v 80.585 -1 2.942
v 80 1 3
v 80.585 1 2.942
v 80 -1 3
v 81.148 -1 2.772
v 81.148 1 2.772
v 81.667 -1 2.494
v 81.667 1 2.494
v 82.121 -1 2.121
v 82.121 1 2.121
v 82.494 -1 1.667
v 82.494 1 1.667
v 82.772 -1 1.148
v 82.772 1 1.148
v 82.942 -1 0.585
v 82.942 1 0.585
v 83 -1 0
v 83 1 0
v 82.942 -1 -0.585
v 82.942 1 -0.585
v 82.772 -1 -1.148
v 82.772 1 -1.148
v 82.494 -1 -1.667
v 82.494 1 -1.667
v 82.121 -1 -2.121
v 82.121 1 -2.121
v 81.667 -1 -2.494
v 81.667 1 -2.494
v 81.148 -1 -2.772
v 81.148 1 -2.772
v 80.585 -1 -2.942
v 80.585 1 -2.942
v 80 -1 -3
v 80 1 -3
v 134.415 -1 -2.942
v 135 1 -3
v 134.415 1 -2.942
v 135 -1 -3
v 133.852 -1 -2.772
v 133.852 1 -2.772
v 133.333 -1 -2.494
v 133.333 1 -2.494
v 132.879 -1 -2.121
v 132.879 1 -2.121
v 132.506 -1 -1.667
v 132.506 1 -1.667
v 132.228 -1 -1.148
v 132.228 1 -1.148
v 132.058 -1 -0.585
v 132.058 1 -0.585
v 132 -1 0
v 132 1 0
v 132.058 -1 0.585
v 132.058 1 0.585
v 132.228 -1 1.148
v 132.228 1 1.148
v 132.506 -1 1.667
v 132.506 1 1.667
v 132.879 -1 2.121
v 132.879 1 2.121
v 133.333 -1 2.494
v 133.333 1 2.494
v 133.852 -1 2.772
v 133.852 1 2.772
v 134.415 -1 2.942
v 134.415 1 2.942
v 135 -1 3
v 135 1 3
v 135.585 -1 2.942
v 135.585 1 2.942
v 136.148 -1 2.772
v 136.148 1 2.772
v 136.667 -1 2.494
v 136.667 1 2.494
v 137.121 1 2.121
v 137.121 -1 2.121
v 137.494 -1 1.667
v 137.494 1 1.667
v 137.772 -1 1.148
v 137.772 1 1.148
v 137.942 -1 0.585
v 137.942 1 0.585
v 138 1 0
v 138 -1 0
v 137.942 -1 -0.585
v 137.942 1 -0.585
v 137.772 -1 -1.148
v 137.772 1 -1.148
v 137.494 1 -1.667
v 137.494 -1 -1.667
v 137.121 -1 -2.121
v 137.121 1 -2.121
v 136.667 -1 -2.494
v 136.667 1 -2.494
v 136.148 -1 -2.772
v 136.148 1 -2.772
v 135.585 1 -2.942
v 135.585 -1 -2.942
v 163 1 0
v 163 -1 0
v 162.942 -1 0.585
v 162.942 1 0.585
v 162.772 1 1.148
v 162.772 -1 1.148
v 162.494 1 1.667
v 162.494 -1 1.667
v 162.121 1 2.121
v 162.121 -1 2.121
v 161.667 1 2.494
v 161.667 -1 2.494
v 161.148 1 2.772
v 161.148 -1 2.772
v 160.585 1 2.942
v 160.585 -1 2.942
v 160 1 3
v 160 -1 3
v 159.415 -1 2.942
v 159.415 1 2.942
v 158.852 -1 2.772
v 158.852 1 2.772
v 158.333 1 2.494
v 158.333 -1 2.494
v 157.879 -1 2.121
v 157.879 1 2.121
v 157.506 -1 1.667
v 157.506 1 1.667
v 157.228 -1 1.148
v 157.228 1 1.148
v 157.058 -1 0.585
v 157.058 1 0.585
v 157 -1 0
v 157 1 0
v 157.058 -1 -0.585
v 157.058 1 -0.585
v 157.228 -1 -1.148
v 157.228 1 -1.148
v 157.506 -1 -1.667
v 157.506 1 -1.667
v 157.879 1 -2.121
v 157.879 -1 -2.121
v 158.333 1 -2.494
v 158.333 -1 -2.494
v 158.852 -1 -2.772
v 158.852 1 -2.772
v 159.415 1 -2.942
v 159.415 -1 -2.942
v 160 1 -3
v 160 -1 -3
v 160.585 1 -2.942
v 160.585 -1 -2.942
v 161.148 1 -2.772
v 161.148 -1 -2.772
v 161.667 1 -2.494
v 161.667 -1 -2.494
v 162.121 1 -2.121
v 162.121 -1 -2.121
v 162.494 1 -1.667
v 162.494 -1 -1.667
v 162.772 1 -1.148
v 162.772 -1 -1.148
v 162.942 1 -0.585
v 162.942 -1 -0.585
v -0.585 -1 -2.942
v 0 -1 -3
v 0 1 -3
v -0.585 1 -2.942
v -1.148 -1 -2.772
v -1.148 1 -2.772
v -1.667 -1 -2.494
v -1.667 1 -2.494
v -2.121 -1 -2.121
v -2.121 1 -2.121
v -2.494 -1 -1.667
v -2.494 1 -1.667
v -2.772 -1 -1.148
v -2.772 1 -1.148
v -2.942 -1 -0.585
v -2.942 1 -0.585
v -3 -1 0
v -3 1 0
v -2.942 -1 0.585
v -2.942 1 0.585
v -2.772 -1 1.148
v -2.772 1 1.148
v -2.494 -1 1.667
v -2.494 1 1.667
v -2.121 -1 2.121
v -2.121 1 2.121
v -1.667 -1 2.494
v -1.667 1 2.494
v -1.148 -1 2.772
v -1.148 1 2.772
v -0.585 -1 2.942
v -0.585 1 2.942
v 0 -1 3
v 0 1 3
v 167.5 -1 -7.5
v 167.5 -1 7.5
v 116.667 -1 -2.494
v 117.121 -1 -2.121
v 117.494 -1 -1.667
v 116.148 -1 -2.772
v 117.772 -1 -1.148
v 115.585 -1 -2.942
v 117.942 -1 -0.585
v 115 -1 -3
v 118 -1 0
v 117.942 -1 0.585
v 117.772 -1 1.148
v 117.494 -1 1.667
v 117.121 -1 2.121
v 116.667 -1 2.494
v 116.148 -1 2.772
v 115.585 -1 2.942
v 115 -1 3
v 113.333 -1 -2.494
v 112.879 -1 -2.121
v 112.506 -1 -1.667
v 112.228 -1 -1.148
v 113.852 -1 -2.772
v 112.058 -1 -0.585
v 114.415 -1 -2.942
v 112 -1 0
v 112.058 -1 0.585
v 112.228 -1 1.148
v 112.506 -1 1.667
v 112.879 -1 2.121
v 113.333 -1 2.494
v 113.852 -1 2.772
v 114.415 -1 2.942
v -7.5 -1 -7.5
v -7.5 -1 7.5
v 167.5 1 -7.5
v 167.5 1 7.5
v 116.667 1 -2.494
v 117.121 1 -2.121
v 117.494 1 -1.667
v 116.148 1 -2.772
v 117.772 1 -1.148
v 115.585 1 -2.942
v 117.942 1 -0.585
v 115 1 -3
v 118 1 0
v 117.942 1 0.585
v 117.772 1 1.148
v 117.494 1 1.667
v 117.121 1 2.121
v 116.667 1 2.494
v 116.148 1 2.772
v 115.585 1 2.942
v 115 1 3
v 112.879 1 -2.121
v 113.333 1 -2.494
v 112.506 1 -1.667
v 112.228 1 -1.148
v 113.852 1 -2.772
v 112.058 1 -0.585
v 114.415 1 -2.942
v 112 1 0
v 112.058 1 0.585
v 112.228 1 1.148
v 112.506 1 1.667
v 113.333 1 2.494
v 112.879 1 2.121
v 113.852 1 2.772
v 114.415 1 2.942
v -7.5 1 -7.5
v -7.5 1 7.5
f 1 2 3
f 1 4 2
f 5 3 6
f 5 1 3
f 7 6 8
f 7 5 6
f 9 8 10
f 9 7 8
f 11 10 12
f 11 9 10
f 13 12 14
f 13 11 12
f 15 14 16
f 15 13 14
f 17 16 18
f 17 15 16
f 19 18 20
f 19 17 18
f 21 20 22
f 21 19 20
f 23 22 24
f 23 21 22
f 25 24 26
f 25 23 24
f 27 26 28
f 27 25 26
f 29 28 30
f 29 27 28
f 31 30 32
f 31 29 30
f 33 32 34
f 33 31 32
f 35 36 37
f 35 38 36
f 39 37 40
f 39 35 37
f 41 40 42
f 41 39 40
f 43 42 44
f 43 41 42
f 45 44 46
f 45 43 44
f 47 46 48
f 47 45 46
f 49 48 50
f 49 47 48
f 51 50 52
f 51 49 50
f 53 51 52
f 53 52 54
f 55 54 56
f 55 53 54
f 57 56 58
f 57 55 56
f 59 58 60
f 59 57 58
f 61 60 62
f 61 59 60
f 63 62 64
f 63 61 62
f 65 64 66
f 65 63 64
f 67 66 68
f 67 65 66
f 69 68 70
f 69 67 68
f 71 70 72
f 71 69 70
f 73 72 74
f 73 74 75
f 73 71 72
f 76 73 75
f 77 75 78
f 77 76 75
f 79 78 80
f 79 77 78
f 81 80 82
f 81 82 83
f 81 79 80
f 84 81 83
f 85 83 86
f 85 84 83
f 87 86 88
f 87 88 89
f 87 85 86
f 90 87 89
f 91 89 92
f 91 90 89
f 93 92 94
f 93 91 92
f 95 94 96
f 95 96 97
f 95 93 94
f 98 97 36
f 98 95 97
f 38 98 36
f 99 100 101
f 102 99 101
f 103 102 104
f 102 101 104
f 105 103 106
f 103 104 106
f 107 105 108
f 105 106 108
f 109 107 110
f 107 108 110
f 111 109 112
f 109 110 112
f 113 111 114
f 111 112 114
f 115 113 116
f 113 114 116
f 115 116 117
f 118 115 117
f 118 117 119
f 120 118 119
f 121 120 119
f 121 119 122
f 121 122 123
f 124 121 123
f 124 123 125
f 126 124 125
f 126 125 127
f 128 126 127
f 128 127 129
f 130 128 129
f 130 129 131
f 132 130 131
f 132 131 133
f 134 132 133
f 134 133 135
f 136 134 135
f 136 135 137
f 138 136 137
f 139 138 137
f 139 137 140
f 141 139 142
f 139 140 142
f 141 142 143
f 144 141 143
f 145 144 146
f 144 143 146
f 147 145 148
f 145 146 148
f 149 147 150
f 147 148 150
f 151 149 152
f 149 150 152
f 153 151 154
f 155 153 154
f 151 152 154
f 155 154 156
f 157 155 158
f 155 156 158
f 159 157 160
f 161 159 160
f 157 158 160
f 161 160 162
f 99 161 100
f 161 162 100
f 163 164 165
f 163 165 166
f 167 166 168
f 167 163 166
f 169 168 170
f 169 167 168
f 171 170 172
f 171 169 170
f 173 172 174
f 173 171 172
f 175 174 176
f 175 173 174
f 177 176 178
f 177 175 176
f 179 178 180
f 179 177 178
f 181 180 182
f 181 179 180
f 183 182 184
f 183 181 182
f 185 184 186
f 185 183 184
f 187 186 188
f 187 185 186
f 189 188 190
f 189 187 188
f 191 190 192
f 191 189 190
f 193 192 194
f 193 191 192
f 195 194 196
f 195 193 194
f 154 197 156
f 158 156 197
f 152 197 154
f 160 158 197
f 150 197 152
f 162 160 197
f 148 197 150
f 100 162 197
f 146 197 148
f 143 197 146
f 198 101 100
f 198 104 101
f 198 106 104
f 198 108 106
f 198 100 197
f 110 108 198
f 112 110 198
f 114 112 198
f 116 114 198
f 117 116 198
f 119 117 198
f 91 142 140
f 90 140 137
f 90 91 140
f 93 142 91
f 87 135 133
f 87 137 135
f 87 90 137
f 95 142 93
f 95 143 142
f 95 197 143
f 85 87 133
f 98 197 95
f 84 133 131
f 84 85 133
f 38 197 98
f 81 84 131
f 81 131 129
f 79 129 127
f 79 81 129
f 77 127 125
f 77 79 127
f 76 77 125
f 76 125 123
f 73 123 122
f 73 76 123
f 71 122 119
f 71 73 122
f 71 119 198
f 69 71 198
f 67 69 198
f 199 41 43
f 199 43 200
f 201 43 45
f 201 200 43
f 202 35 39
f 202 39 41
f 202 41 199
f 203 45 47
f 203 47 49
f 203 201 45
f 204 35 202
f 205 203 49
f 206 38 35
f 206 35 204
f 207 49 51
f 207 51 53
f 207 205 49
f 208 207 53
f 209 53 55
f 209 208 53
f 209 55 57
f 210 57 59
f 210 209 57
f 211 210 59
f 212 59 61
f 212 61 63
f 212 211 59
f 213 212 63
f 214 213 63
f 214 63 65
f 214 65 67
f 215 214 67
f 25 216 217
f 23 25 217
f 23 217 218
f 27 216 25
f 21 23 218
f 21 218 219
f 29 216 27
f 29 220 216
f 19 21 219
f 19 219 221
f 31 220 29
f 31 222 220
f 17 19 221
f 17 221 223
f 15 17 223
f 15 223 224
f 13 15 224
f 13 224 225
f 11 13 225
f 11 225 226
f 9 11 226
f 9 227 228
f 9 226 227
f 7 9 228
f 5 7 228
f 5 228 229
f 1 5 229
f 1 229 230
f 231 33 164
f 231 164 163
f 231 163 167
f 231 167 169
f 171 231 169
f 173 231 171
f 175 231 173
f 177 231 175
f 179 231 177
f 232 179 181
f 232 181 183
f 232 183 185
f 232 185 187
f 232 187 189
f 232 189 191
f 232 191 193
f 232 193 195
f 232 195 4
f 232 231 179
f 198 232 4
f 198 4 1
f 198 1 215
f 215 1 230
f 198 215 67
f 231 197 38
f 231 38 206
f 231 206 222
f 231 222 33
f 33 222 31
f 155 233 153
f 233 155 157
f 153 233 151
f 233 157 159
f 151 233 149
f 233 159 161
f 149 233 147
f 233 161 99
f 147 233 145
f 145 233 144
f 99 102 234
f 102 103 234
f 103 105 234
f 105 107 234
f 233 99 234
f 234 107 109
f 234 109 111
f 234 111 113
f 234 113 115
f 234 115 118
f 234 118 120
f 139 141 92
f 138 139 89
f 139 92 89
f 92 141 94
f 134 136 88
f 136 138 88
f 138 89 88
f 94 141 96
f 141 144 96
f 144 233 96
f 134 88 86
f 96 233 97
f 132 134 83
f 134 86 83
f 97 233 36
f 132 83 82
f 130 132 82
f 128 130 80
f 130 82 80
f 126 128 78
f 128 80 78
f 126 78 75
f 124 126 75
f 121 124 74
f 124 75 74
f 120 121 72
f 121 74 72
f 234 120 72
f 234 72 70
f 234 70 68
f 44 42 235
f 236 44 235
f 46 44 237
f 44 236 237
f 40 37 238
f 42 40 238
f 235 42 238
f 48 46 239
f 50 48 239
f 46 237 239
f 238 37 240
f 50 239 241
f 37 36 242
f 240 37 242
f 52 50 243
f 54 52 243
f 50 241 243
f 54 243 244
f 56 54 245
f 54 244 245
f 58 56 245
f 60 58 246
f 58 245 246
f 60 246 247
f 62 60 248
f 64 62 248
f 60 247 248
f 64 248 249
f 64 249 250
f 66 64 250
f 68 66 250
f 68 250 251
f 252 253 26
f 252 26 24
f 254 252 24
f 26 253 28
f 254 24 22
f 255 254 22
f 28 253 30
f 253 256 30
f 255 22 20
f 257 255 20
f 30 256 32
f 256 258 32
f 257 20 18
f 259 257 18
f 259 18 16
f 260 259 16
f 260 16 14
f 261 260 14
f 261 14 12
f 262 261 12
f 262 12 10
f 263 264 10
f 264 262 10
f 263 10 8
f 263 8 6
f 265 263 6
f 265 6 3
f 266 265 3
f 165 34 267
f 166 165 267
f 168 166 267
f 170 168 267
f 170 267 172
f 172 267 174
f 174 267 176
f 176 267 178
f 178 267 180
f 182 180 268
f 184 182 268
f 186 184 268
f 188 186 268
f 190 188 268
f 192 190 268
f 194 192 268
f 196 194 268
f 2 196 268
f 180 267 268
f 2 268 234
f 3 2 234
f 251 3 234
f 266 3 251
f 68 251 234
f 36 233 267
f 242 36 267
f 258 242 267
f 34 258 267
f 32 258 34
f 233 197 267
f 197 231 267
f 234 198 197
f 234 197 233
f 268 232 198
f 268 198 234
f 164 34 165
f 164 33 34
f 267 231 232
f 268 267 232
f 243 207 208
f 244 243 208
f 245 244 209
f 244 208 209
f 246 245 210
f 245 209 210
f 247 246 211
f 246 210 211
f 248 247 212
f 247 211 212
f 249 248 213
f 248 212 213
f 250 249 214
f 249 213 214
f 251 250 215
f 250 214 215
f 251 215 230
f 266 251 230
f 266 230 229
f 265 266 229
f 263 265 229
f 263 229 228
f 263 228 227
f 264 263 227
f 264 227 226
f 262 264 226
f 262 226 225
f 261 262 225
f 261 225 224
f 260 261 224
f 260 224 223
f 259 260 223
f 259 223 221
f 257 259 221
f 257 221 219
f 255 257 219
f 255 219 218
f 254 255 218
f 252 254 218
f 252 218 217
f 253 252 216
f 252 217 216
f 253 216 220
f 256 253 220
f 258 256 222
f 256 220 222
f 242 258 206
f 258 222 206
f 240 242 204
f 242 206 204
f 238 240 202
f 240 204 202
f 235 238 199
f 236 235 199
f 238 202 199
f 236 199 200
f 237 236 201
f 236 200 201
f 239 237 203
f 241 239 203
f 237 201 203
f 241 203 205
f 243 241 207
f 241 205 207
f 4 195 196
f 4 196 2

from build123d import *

# Parameters (mm, degrees)
F0_W     = 150
F0_H     = 15
F1_DEPTH = 1
F2_W     = 2
F2_H     = 15
F3_DEPTH = 25
F4_R     = 3
F5_DEPTH = 2.001
F6_R     = 3
F7_DEPTH = 2.001


with BuildPart() as f1:
    # F0 (on Front) → F1 (new body, symmetric)
    with BuildSketch(Plane.XZ):
        with Locations((67.5, 0)):
            Rectangle(F0_W, F0_H)
        with BuildLine():
            ThreePointArc((0, -3), (-3, 0), (0, 3))
            Line((0, 3), (80, 3))
            ThreePointArc((80, 3), (83, 0), (80, -3))
            Line((80, -3), (0, -3))
        make_face(mode=Mode.SUBTRACT)
        with BuildLine():
            ThreePointArc((135, 3), (138, 0), (135, -3))
            ThreePointArc((135, -3), (132, 0), (135, 3))
        make_face(mode=Mode.SUBTRACT)
    extrude(amount=F1_DEPTH, both=True)

    # F2 (on face) → F3 (join)
    with BuildSketch(Plane.YZ.offset(142.5)):
        Rectangle(F2_W, F2_H)
    extrude(amount=F3_DEPTH)

    # F4 (on face) → F5 (cut, through all)
    with BuildSketch(Plane.XZ.offset(1)):
        with Locations((160, 0)):
            Circle(F4_R)
    extrude(amount=-F5_DEPTH, mode=Mode.SUBTRACT)

    # F6 (on face) → F7 (cut, through all)
    with BuildSketch(Plane.XZ.offset(1)):
        with Locations((115, 0)):
            Circle(F6_R)
    extrude(amount=-F7_DEPTH, mode=Mode.SUBTRACT)


solid = f1.part
